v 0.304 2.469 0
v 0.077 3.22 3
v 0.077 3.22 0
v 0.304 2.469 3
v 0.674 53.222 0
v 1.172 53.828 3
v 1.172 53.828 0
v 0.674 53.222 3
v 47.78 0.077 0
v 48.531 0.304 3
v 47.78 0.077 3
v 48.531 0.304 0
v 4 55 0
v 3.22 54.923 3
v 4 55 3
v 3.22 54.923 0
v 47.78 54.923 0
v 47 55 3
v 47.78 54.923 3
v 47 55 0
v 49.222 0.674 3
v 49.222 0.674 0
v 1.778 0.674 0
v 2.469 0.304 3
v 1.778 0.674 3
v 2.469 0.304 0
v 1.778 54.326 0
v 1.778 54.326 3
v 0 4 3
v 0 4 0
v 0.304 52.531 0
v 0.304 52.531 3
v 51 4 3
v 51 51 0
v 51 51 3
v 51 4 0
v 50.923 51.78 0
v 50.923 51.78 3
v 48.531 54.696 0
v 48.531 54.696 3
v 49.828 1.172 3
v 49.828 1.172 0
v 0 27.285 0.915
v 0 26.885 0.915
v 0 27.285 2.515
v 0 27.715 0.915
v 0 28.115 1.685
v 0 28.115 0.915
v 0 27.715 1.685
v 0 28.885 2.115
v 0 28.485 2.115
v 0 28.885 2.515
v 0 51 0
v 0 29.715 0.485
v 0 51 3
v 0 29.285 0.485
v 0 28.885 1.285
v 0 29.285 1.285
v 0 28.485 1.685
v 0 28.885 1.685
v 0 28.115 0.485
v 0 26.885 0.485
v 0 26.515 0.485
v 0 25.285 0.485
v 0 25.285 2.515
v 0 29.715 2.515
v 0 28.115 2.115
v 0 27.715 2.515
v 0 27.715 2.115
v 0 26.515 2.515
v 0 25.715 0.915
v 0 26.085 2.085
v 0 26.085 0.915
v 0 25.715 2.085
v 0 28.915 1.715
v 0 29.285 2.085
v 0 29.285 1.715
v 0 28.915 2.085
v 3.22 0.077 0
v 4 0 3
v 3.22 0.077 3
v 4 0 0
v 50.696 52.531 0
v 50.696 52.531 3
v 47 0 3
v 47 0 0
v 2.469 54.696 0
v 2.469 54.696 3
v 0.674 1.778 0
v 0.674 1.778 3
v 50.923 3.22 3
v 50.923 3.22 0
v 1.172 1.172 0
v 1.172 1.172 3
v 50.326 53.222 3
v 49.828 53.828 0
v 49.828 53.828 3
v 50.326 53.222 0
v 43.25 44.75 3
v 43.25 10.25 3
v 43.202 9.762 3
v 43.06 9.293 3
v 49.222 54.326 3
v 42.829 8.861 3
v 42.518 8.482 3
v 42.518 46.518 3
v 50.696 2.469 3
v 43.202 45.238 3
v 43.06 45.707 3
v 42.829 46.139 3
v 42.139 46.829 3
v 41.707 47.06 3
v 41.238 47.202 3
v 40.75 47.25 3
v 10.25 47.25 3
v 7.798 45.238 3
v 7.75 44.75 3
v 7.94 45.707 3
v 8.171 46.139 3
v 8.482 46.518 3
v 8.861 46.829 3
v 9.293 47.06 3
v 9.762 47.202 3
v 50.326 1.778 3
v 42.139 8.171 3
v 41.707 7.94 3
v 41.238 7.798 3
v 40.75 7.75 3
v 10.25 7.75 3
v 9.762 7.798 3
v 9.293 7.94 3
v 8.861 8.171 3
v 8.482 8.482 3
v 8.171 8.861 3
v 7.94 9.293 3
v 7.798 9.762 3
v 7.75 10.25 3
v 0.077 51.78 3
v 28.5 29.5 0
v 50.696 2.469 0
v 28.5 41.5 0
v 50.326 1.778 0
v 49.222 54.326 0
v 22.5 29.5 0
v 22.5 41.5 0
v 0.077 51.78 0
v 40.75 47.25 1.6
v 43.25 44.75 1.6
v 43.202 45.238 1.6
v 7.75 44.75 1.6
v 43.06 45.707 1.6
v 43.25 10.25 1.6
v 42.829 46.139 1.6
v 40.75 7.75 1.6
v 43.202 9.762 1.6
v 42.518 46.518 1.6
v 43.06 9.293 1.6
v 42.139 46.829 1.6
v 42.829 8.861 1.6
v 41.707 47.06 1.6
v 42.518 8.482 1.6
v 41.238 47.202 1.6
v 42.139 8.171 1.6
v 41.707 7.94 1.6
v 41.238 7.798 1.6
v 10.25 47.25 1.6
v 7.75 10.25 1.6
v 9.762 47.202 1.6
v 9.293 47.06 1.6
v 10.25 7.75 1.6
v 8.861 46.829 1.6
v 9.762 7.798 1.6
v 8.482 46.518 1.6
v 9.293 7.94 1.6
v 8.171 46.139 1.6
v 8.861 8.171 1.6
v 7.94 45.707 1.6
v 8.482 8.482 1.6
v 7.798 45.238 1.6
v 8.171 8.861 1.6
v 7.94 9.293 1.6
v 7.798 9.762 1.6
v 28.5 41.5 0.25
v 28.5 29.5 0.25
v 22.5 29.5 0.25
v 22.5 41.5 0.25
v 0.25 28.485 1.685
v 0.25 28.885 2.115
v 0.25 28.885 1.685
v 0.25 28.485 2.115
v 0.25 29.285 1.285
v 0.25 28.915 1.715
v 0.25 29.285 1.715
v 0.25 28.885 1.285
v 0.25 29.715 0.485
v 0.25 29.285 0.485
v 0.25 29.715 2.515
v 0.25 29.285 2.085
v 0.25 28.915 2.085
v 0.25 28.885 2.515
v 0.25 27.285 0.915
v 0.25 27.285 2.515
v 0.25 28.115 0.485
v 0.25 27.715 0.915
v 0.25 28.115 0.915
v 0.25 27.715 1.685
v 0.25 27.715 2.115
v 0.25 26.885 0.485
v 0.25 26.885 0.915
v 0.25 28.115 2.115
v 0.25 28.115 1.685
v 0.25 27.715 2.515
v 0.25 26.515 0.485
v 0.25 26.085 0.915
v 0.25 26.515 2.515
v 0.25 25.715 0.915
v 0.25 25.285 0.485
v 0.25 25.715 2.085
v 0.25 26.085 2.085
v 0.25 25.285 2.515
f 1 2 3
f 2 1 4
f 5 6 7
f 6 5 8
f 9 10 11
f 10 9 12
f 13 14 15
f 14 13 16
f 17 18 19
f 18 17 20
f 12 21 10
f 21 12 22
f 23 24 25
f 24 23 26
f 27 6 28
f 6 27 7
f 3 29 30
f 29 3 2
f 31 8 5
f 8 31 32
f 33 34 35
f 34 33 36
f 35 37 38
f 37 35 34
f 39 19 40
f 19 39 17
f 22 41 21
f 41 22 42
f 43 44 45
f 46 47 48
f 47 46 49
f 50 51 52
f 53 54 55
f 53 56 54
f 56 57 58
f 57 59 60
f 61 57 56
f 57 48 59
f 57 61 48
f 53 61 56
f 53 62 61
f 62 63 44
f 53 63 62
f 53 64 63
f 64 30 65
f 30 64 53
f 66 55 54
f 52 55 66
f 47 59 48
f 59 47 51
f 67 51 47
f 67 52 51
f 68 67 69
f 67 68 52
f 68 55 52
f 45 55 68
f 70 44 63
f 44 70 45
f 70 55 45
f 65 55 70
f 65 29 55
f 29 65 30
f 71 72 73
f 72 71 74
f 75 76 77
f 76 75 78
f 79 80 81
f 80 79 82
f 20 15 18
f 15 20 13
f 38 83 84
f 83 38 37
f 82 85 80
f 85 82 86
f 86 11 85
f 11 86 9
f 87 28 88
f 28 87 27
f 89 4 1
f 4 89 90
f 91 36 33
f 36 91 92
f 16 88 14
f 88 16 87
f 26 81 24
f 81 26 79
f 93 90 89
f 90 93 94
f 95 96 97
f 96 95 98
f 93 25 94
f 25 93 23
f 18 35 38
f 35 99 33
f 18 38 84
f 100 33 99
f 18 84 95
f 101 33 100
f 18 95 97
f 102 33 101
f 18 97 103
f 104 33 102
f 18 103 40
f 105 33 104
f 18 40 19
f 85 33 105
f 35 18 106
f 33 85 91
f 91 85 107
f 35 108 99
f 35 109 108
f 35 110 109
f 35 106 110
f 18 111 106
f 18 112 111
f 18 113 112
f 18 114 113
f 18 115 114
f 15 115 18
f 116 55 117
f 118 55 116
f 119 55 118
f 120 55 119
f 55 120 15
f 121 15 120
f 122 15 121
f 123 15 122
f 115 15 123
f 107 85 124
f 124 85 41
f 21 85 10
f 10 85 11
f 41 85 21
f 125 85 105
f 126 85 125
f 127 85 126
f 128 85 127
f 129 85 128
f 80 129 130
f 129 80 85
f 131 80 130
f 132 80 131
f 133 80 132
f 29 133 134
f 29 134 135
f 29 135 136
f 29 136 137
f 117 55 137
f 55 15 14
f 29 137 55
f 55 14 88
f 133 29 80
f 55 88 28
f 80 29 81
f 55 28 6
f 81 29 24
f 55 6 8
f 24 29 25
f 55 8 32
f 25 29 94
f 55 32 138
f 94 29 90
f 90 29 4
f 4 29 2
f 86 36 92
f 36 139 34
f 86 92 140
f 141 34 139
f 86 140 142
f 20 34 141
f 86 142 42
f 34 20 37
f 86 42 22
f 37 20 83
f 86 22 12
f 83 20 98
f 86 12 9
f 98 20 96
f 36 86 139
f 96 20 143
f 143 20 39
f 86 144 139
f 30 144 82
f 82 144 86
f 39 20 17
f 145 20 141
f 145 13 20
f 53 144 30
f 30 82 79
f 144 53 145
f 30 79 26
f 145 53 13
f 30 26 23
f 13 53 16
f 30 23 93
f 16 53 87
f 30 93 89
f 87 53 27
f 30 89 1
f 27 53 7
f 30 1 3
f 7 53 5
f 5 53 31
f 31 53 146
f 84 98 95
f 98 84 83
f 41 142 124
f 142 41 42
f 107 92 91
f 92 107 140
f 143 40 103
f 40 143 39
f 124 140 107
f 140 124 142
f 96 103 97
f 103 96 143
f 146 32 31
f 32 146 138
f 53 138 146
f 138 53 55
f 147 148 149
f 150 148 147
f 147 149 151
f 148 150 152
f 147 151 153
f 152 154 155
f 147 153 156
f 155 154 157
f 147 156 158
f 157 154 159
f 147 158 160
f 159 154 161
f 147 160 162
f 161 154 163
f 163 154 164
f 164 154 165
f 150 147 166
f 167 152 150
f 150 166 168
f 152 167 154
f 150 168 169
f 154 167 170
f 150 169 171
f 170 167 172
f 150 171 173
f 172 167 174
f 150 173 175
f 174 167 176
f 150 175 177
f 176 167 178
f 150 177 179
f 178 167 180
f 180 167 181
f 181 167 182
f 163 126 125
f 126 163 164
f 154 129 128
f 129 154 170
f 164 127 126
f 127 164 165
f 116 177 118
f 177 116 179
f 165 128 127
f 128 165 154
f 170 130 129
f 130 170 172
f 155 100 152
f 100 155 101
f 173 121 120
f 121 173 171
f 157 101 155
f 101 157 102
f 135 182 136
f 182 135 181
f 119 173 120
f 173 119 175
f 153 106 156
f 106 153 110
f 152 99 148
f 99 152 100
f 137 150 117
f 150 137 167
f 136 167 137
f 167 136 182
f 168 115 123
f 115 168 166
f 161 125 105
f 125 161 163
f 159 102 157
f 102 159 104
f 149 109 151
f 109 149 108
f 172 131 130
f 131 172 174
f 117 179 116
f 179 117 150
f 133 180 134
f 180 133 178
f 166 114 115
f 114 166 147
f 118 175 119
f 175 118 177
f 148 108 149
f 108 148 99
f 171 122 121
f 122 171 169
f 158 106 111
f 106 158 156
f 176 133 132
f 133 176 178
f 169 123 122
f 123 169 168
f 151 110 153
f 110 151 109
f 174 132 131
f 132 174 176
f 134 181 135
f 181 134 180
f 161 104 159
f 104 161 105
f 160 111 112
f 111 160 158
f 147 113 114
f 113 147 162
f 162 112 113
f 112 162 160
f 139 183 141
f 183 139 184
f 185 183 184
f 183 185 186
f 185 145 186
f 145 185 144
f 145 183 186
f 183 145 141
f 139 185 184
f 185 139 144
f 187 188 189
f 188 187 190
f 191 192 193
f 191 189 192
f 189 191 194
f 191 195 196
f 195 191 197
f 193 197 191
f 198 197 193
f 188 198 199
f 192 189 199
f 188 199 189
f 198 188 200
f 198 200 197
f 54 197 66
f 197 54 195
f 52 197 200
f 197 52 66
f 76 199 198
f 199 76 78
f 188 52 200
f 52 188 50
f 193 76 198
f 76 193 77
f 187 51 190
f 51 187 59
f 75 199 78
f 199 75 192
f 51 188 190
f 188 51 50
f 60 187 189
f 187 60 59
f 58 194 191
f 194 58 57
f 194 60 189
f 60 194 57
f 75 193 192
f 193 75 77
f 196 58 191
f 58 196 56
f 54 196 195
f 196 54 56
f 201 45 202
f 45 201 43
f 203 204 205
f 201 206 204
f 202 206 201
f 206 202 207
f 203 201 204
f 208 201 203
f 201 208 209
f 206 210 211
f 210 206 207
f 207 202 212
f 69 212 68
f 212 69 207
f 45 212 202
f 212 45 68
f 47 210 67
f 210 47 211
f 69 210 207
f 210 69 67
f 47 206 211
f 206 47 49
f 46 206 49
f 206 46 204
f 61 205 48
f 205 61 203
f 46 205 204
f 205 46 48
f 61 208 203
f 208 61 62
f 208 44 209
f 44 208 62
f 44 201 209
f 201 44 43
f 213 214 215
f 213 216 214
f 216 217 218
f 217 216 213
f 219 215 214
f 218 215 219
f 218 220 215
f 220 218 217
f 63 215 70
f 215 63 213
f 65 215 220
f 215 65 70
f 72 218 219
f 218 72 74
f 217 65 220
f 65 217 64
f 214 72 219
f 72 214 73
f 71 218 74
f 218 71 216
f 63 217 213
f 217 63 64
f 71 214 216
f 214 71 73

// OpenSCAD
// 選配重力壓牌滑板
$fn=64;
translate([47.5,27.5,-97]){rotate([0,0,0]){difference(){difference(){difference(){translate([-22,0,0]){translate([0,0,97]){linear_extrude(height=3)polygon([[25.5,23.5],[25.42314,24.28036],[25.19552,25.03073],[24.82588,25.72228],[24.32843,26.32843],[23.72228,26.82588],[23.03073,27.19552],[22.28036,27.42314],[21.5,27.5],[-21.5,27.5],[-22.28036,27.42314],[-23.03073,27.19552],[-23.72228,26.82588],[-24.32843,26.32843],[-24.82588,25.72228],[-25.19552,25.03073],[-25.42314,24.28036],[-25.5,23.5],[-25.5,-23.5],[-25.42314,-24.28036],[-25.19552,-25.03073],[-24.82588,-25.72228],[-24.32843,-26.32843],[-23.72228,-26.82588],[-23.03073,-27.19552],[-22.28036,-27.42314],[-21.5,-27.5],[21.5,-27.5],[22.28036,-27.42314],[23.03073,-27.19552],[23.72228,-26.82588],[24.32843,-26.32843],[24.82588,-25.72228],[25.19552,-25.03073],[25.42314,-24.28036],[25.5,-23.5]]);}}translate([-22,0,0]){translate([0,0,98.6]){linear_extrude(height=1.5)polygon([[17.75,17.25],[17.70196,17.73773],[17.5597,18.20671],[17.32867,18.63893],[17.01777,19.01777],[16.63893,19.32867],[16.20671,19.5597],[15.73773,19.70196],[15.25,19.75],[-15.25,19.75],[-15.73773,19.70196],[-16.20671,19.5597],[-16.63893,19.32867],[-17.01777,19.01777],[-17.32867,18.63893],[-17.5597,18.20671],[-17.70196,17.73773],[-17.75,17.25],[-17.75,-17.25],[-17.70196,-17.73773],[-17.5597,-18.20671],[-17.32867,-18.63893],[-17.01777,-19.01777],[-16.63893,-19.32867],[-16.20671,-19.5597],[-15.73773,-19.70196],[-15.25,-19.75],[15.25,-19.75],[15.73773,-19.70196],[16.20671,-19.5597],[16.63893,-19.32867],[17.01777,-19.01777],[17.32867,-18.63893],[17.5597,-18.20671],[17.70196,-17.73773],[17.75,-17.25]]);}}}translate([-25,2,96.95]){cube([6,12,0.3]);}}multmatrix([[0,0,-1,-47.5],[-1,0,0,0],[0,1,0,98.5],[0,0,0,1]]){union(){union(){union(){union(){union(){union(){union(){union(){union(){union(){union(){union(){union(){union(){union(){union(){union(){union(){union(){union(){union(){union(){union(){union(){union(){union(){union(){translate([-2.215,0.585,-0.25]){cube([0.43,0.43,0.37]);}translate([-1.815,0.585,-0.25]){cube([0.43,0.43,0.37]);}}translate([-2.215,0.185,-0.25]){cube([0.43,0.43,0.37]);}}translate([-1.415,0.185,-0.25]){cube([0.43,0.43,0.37]);}}translate([-2.215,-0.215,-0.25]){cube([0.43,0.43,0.37]);}}translate([-1.815,-0.215,-0.25]){cube([0.43,0.43,0.37]);}}translate([-2.215,-0.615,-0.25]){cube([0.43,0.43,0.37]);}}translate([-2.215,-1.015,-0.25]){cube([0.43,0.43,0.37]);}}translate([-0.215,0.585,-0.25]){cube([0.43,0.43,0.37]);}}translate([-0.615,0.185,-0.25]){cube([0.43,0.43,0.37]);}}translate([-0.215,0.185,-0.25]){cube([0.43,0.43,0.37]);}}translate([-0.215,-0.215,-0.25]){cube([0.43,0.43,0.37]);}}translate([-0.215,-0.615,-0.25]){cube([0.43,0.43,0.37]);}}translate([-0.615,-1.015,-0.25]){cube([0.43,0.43,0.37]);}}translate([-0.215,-1.015,-0.25]){cube([0.43,0.43,0.37]);}}translate([0.185,-1.015,-0.25]){cube([0.43,0.43,0.37]);}}translate([0.985,0.585,-0.25]){cube([0.43,0.43,0.37]);}}translate([1.385,0.585,-0.25]){cube([0.43,0.43,0.37]);}}translate([1.785,0.585,-0.25]){cube([0.43,0.43,0.37]);}}translate([0.985,0.185,-0.25]){cube([0.43,0.43,0.37]);}}translate([1.785,0.185,-0.25]){cube([0.43,0.43,0.37]);}}translate([0.985,-0.215,-0.25]){cube([0.43,0.43,0.37]);}}translate([1.785,-0.215,-0.25]){cube([0.43,0.43,0.37]);}}translate([0.985,-0.615,-0.25]){cube([0.43,0.43,0.37]);}}translate([1.785,-0.615,-0.25]){cube([0.43,0.43,0.37]);}}translate([0.985,-1.015,-0.25]){cube([0.43,0.43,0.37]);}}translate([1.385,-1.015,-0.25]){cube([0.43,0.43,0.37]);}}translate([1.785,-1.015,-0.25]){cube([0.43,0.43,0.37]);}}}}}}
